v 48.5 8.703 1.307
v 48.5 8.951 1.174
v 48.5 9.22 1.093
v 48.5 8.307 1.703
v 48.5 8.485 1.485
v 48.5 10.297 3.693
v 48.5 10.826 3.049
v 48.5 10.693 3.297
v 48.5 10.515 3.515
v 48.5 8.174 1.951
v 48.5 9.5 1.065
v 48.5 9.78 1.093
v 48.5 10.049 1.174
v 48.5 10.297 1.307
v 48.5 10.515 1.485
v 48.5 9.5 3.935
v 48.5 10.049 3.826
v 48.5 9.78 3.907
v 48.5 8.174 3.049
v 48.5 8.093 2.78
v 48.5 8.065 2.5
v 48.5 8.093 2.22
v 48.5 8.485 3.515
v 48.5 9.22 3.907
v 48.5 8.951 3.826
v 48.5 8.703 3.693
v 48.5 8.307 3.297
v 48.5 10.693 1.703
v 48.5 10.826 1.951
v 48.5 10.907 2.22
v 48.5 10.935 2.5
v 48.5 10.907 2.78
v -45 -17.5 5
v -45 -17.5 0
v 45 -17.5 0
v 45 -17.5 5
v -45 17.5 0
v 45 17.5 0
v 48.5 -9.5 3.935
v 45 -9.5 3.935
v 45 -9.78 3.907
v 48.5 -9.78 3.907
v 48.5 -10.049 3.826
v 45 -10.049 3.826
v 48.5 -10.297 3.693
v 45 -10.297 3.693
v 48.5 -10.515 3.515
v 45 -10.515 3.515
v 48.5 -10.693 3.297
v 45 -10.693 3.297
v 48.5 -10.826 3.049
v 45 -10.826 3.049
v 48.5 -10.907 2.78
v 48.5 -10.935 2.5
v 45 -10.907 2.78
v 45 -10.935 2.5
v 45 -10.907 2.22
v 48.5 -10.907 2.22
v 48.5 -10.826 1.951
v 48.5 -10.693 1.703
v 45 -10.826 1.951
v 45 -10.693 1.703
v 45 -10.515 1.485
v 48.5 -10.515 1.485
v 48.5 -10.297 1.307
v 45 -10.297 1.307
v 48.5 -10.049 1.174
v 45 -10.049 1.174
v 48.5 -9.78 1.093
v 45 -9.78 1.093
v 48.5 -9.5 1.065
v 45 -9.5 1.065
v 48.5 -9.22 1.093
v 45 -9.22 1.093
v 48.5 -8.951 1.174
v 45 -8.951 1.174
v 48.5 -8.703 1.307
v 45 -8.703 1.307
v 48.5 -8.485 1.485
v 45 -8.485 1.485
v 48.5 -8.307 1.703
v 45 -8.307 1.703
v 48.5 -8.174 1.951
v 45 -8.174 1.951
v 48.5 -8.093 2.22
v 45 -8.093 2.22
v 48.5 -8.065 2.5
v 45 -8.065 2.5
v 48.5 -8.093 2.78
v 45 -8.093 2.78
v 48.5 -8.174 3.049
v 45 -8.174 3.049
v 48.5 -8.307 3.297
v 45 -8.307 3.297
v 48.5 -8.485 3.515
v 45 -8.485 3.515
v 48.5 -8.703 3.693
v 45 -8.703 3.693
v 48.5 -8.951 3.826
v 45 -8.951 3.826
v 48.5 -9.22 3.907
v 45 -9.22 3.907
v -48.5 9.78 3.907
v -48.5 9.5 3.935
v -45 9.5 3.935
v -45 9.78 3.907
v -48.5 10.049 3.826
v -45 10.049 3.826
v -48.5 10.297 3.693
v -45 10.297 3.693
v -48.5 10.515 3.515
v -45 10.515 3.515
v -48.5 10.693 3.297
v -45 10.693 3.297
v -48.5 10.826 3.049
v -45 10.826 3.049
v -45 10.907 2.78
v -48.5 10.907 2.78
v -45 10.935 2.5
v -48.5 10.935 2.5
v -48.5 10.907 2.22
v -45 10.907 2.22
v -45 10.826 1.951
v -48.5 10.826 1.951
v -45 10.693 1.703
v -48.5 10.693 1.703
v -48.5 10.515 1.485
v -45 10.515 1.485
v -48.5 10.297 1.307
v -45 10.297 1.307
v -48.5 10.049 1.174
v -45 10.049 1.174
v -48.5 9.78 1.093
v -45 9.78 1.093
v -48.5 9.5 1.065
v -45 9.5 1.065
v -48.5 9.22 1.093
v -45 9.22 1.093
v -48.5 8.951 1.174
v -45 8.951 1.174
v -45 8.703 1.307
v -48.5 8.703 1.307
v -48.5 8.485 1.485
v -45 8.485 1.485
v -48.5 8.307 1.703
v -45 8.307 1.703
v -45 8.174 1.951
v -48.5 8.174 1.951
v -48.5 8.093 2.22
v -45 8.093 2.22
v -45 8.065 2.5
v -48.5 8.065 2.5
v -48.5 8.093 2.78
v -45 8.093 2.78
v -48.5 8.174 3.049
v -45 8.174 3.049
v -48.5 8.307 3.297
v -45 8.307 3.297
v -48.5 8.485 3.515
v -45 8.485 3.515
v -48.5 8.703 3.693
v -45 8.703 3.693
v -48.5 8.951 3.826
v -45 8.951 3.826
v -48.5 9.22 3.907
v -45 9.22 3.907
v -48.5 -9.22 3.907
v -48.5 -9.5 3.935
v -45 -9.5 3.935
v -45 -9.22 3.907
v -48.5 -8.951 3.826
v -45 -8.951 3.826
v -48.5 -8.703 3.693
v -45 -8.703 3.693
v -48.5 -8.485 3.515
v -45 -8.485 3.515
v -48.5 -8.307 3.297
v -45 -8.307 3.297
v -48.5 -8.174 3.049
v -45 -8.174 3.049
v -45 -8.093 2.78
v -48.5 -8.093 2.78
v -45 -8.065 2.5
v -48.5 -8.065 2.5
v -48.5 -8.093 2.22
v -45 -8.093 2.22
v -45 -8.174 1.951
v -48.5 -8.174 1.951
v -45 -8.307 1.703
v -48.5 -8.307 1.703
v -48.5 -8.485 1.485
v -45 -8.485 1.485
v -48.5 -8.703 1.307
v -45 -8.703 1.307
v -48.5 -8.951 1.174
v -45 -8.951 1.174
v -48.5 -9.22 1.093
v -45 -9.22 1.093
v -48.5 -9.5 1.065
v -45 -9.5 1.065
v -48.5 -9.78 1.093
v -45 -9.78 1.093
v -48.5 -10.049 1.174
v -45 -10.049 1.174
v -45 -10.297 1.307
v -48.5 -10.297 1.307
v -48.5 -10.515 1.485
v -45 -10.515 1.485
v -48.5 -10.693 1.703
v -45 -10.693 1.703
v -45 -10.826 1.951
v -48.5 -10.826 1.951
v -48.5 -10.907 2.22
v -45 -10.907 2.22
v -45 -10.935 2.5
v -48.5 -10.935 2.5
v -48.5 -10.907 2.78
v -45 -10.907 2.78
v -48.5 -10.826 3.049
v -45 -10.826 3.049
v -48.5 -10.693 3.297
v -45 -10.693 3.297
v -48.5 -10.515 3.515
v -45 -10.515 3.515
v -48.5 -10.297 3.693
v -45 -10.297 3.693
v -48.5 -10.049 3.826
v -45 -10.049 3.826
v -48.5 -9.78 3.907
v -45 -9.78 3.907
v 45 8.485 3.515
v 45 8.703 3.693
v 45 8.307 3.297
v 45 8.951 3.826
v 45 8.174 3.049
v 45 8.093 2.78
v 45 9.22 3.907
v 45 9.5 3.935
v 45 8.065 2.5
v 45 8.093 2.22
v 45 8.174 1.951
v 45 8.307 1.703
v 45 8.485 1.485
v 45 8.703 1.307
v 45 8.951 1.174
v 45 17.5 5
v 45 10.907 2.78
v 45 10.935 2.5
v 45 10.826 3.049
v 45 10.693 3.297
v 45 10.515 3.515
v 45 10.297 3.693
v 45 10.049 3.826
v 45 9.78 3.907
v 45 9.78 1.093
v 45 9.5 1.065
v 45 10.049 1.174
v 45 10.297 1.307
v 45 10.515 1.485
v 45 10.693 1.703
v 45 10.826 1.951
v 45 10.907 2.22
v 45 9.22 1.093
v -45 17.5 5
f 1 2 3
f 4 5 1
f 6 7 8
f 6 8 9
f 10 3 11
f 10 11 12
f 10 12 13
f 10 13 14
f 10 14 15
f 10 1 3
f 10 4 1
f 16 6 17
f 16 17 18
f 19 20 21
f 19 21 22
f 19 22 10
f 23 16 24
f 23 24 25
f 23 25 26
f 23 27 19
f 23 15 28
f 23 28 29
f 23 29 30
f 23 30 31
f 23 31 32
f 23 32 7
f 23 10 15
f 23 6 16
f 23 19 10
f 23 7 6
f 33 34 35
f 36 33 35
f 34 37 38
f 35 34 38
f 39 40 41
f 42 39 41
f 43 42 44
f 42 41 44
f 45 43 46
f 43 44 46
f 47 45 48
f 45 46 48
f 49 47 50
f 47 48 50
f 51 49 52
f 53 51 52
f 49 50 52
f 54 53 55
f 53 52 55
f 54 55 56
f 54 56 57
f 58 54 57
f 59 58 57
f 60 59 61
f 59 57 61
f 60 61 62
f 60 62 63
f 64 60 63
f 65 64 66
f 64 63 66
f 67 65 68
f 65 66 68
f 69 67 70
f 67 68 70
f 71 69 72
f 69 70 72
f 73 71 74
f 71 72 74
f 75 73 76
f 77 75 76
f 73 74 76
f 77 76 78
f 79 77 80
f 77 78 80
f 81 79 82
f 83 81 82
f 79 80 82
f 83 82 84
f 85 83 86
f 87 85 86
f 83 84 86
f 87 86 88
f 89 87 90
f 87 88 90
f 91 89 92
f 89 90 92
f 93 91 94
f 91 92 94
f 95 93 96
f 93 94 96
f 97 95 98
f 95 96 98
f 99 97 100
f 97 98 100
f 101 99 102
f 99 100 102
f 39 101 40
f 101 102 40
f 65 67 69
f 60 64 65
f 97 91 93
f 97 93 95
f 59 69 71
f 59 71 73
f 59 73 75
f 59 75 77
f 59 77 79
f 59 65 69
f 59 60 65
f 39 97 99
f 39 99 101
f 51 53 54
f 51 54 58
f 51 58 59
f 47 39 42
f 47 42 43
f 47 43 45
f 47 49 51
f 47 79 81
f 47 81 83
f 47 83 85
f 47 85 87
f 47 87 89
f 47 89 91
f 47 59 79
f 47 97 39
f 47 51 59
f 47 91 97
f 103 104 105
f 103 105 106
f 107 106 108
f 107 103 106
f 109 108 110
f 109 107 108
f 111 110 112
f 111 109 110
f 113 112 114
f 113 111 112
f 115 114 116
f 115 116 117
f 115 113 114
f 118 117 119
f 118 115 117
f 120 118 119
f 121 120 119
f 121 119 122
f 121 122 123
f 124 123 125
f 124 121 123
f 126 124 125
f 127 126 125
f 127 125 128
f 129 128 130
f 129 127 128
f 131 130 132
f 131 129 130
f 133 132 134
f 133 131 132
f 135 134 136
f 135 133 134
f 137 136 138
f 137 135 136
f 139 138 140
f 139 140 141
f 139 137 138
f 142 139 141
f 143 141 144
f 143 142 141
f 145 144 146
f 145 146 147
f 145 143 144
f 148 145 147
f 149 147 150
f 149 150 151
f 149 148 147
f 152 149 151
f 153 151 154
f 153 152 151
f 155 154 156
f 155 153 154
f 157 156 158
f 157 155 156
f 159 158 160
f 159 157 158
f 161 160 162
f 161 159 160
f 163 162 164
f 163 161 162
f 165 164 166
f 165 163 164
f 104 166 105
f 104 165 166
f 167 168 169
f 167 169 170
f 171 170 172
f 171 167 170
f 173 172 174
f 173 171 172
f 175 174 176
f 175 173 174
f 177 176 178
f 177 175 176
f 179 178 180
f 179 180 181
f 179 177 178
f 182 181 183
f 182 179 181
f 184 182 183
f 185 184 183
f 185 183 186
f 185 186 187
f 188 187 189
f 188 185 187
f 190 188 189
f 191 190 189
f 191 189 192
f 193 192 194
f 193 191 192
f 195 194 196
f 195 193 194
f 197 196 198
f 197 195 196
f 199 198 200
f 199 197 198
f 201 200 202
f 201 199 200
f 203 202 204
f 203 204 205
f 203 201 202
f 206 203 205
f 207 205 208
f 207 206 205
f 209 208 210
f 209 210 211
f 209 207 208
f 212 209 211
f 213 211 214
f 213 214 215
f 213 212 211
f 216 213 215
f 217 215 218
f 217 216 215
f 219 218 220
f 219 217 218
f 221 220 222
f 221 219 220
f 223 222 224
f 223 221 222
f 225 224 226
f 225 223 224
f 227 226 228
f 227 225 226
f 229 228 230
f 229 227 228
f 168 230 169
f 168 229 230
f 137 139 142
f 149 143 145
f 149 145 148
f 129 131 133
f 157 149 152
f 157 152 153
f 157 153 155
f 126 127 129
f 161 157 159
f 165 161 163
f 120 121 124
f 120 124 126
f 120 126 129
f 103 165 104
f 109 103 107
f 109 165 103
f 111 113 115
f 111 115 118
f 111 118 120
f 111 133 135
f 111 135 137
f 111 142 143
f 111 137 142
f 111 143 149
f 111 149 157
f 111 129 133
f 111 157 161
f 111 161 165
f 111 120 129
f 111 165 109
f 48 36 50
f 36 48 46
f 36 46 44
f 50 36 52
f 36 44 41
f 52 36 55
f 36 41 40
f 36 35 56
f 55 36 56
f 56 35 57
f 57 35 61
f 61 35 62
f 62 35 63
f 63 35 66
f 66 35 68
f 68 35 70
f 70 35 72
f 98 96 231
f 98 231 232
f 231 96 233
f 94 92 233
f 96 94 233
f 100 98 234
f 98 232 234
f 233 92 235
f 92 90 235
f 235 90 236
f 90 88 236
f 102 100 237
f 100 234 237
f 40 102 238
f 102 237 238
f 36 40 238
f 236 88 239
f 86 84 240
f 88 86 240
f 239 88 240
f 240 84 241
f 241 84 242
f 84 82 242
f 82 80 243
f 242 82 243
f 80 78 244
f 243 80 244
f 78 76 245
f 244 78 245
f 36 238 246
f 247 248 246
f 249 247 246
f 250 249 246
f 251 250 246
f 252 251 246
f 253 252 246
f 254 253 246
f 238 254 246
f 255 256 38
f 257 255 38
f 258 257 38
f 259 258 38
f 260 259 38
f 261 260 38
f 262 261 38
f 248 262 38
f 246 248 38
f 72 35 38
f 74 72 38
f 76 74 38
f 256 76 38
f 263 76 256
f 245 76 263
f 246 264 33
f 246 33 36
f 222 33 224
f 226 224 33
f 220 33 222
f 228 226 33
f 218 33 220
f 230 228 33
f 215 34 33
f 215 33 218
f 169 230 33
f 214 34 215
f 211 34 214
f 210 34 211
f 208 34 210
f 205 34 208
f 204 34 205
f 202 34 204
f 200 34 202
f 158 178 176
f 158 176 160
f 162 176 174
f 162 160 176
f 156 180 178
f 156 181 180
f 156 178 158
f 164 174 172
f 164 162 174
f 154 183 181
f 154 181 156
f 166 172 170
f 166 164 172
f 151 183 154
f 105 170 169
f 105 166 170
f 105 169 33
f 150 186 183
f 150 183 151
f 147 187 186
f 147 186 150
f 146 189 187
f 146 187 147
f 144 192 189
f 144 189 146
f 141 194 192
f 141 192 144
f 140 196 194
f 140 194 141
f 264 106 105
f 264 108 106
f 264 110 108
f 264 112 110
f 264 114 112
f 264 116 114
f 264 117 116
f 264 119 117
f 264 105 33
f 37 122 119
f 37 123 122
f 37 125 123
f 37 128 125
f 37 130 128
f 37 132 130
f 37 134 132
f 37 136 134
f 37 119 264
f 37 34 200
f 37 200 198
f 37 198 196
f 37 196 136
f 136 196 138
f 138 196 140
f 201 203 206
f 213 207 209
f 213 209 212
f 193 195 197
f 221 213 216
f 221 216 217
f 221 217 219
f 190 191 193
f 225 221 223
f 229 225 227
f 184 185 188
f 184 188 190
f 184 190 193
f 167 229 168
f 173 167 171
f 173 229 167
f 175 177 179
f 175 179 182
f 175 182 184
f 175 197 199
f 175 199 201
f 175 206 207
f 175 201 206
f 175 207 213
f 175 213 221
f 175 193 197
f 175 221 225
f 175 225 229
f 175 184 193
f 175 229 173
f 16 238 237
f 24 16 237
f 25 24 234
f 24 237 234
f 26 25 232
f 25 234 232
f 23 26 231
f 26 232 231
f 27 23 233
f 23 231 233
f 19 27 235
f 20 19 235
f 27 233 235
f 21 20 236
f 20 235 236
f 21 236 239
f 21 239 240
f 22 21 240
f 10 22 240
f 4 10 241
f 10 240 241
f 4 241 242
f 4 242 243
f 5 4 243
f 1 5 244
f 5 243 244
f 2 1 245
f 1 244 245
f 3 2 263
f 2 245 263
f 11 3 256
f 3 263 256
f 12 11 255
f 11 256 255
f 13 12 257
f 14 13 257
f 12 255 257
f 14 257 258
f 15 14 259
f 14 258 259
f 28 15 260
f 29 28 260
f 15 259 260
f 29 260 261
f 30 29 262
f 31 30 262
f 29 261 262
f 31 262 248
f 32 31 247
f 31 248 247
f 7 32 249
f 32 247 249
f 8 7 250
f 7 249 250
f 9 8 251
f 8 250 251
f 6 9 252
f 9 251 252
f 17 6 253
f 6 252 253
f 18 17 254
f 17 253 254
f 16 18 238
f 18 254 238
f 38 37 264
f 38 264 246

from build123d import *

# Parameters (mm, degrees)
SKETCH1_W           = 90
SKETCH1_H           = 35
BOSS_EXTRUDE1_DEPTH = 5
SKETCH2_R           = 1.435
BOSS_EXTRUDE2_DEPTH = 3.5
BOSS_EXTRUDE3_START = 3.5
SKETCH3_R           = 1.435
BOSS_EXTRUDE3_DEPTH = 3.5


with BuildPart() as part:
    # Sketch1 → Boss-Extrude1 (new body)
    with BuildSketch(Plane.XY):
        Rectangle(SKETCH1_W, SKETCH1_H)
    extrude(amount=BOSS_EXTRUDE1_DEPTH)

    # Sketch2 → Boss-Extrude2 (add)
    with BuildSketch(Plane(origin=(45, 0, 0), x_dir=(0, 0, -1), z_dir=(1, 0, 0))):
        with Locations(Location((-2.5, 9.5, 0), (0, 0, 180))):
            Circle(SKETCH2_R)
        with Locations(Location((-2.5, -9.5, 0), (0, 0, 180))):
            Circle(SKETCH2_R)
    extrude(amount=BOSS_EXTRUDE2_DEPTH)

    # Sketch3 → Boss-Extrude3 (add)
    with BuildSketch(Plane.ZY.offset(45).offset(BOSS_EXTRUDE3_START)):
        with Locations((2.5, 9.5)):
            Circle(SKETCH3_R)
        with Locations((2.5, -9.5)):
            Circle(SKETCH3_R)
    extrude(amount=-BOSS_EXTRUDE3_DEPTH)


solid = part.part
